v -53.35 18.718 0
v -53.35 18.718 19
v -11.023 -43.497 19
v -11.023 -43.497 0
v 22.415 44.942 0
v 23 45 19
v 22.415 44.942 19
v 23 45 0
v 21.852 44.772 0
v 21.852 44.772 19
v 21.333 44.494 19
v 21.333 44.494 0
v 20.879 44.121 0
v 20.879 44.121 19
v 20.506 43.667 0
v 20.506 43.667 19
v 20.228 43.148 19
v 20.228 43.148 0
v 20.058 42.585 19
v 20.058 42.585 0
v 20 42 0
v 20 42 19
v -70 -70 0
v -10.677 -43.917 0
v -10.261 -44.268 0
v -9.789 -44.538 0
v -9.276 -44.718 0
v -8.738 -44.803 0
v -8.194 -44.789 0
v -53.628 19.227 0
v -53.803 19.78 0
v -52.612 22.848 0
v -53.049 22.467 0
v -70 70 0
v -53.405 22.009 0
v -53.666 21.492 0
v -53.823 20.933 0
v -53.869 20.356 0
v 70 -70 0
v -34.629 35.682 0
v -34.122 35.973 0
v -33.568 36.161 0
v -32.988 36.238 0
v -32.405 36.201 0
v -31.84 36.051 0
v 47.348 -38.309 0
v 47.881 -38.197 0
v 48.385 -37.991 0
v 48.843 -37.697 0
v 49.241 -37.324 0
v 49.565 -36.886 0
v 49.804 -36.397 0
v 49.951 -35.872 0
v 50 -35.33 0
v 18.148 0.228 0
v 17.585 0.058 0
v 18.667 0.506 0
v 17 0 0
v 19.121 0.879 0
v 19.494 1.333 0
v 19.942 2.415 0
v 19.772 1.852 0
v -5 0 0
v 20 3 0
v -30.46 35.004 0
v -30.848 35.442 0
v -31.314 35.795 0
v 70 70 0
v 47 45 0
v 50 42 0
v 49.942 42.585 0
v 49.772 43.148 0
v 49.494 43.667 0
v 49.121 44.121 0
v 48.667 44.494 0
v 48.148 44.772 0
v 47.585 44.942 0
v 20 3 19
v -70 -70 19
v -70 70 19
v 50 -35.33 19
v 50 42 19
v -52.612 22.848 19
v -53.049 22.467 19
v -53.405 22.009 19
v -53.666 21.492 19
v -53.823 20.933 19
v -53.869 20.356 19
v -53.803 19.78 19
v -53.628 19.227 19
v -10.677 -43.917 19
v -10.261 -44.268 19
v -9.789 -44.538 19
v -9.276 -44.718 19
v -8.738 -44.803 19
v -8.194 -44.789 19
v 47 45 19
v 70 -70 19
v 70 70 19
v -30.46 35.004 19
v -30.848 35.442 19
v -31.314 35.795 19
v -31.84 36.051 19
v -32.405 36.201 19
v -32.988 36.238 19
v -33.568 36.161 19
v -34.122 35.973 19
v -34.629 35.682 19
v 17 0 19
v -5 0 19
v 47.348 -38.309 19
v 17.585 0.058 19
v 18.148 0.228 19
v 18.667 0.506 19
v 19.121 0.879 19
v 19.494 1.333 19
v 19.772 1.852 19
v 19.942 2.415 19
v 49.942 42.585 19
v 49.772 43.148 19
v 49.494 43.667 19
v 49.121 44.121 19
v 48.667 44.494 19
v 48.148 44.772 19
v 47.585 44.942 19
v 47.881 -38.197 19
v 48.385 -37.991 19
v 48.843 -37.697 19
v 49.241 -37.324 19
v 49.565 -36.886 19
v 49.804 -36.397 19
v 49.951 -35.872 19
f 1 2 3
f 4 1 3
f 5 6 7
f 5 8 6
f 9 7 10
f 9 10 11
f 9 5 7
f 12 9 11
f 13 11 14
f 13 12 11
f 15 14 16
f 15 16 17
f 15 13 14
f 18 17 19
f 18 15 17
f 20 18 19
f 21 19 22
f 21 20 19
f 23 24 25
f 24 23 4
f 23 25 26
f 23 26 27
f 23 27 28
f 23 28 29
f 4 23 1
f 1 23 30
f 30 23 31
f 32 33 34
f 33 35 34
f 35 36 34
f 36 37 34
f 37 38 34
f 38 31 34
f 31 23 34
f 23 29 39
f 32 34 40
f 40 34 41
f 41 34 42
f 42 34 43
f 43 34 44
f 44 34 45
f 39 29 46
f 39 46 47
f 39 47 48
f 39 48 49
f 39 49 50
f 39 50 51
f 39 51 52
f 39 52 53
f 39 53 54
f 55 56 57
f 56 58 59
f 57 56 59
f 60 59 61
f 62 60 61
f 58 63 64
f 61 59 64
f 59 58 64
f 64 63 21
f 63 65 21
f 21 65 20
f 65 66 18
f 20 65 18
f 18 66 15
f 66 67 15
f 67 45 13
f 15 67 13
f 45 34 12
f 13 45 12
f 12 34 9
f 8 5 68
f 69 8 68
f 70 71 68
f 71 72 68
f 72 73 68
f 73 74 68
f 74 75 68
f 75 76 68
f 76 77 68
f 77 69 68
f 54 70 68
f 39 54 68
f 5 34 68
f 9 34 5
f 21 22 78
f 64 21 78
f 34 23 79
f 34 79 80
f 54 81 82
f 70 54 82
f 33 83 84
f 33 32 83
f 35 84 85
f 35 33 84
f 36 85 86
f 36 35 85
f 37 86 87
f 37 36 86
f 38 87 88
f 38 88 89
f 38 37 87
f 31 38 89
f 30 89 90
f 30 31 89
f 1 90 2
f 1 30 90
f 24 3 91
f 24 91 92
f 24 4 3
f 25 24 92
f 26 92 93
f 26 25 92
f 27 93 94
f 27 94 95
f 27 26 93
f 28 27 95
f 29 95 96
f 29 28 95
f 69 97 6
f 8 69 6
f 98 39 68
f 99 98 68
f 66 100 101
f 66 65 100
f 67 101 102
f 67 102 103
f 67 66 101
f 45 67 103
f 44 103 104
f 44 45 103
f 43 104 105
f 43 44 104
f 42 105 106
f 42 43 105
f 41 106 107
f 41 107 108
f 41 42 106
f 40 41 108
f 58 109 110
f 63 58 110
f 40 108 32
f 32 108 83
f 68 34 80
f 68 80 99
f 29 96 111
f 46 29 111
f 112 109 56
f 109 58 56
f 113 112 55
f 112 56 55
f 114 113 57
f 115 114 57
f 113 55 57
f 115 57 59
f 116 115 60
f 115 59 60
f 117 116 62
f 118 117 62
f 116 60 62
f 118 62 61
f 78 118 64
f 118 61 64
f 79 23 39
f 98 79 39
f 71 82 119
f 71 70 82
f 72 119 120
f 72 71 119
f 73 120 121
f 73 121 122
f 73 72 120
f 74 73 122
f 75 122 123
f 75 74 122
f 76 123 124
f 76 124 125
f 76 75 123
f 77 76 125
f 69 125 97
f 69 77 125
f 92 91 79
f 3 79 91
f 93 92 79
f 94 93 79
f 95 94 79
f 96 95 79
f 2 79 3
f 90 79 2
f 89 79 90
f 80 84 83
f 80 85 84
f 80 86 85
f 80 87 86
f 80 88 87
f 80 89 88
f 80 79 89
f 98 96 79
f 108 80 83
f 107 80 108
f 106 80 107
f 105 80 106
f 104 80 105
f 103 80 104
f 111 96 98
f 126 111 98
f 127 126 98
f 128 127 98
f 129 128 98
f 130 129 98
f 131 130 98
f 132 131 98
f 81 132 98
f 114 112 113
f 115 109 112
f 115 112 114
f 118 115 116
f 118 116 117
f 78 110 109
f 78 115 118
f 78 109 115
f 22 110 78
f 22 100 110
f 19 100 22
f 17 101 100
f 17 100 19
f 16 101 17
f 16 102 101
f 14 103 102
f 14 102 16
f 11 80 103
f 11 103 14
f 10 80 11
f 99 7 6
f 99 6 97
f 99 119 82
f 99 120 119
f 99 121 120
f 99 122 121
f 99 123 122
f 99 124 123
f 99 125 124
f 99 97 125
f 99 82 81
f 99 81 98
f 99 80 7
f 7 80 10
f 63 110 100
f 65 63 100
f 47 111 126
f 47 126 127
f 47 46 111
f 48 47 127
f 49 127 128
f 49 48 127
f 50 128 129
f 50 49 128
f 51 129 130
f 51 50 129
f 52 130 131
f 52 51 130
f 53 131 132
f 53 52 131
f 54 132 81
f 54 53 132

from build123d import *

# Parameters (mm, degrees)
F0_W     = 140
F0_H     = 140
F1_DEPTH = 19
F3_DEPTH = 20
F4_R     = 3


# Not quite as in the source:
# - a feature names something its author has since deleted; it is built from what else it names


with BuildPart() as f1:
    # F0 (on Top) → F1 (new body)
    with BuildSketch(Plane.XY):
        Rectangle(F0_W, F0_H)
    extrude(amount=F1_DEPTH)

    # F2 (on face) → F3 (cut)
    with BuildSketch(Plane.XY.offset(19)):
        Polygon((20, 0), (0, 0), (-5, 0), (-32.2085873907, 37.4088223177), (-55, 21.1437827766), (-10, -45), (50, -38), (50, 45), (20, 45), align=None)
    extrude(amount=-F3_DEPTH, mode=Mode.SUBTRACT)

    # F4
    f4_edges = [f1.edges().sort_by_distance(p)[0] for p in [
        (50, -38, 9.5),
        (50, 45, 9.5),
        (20, 45, 9.5),
        (20, 0, 9.5),
        (-55, 21.143783, 9.5),
        (-10, -45, 9.5),
        (-32.208587, 37.408822, 9.5),
    ]]
    fillet(f4_edges, radius=F4_R)


solid = f1.part
